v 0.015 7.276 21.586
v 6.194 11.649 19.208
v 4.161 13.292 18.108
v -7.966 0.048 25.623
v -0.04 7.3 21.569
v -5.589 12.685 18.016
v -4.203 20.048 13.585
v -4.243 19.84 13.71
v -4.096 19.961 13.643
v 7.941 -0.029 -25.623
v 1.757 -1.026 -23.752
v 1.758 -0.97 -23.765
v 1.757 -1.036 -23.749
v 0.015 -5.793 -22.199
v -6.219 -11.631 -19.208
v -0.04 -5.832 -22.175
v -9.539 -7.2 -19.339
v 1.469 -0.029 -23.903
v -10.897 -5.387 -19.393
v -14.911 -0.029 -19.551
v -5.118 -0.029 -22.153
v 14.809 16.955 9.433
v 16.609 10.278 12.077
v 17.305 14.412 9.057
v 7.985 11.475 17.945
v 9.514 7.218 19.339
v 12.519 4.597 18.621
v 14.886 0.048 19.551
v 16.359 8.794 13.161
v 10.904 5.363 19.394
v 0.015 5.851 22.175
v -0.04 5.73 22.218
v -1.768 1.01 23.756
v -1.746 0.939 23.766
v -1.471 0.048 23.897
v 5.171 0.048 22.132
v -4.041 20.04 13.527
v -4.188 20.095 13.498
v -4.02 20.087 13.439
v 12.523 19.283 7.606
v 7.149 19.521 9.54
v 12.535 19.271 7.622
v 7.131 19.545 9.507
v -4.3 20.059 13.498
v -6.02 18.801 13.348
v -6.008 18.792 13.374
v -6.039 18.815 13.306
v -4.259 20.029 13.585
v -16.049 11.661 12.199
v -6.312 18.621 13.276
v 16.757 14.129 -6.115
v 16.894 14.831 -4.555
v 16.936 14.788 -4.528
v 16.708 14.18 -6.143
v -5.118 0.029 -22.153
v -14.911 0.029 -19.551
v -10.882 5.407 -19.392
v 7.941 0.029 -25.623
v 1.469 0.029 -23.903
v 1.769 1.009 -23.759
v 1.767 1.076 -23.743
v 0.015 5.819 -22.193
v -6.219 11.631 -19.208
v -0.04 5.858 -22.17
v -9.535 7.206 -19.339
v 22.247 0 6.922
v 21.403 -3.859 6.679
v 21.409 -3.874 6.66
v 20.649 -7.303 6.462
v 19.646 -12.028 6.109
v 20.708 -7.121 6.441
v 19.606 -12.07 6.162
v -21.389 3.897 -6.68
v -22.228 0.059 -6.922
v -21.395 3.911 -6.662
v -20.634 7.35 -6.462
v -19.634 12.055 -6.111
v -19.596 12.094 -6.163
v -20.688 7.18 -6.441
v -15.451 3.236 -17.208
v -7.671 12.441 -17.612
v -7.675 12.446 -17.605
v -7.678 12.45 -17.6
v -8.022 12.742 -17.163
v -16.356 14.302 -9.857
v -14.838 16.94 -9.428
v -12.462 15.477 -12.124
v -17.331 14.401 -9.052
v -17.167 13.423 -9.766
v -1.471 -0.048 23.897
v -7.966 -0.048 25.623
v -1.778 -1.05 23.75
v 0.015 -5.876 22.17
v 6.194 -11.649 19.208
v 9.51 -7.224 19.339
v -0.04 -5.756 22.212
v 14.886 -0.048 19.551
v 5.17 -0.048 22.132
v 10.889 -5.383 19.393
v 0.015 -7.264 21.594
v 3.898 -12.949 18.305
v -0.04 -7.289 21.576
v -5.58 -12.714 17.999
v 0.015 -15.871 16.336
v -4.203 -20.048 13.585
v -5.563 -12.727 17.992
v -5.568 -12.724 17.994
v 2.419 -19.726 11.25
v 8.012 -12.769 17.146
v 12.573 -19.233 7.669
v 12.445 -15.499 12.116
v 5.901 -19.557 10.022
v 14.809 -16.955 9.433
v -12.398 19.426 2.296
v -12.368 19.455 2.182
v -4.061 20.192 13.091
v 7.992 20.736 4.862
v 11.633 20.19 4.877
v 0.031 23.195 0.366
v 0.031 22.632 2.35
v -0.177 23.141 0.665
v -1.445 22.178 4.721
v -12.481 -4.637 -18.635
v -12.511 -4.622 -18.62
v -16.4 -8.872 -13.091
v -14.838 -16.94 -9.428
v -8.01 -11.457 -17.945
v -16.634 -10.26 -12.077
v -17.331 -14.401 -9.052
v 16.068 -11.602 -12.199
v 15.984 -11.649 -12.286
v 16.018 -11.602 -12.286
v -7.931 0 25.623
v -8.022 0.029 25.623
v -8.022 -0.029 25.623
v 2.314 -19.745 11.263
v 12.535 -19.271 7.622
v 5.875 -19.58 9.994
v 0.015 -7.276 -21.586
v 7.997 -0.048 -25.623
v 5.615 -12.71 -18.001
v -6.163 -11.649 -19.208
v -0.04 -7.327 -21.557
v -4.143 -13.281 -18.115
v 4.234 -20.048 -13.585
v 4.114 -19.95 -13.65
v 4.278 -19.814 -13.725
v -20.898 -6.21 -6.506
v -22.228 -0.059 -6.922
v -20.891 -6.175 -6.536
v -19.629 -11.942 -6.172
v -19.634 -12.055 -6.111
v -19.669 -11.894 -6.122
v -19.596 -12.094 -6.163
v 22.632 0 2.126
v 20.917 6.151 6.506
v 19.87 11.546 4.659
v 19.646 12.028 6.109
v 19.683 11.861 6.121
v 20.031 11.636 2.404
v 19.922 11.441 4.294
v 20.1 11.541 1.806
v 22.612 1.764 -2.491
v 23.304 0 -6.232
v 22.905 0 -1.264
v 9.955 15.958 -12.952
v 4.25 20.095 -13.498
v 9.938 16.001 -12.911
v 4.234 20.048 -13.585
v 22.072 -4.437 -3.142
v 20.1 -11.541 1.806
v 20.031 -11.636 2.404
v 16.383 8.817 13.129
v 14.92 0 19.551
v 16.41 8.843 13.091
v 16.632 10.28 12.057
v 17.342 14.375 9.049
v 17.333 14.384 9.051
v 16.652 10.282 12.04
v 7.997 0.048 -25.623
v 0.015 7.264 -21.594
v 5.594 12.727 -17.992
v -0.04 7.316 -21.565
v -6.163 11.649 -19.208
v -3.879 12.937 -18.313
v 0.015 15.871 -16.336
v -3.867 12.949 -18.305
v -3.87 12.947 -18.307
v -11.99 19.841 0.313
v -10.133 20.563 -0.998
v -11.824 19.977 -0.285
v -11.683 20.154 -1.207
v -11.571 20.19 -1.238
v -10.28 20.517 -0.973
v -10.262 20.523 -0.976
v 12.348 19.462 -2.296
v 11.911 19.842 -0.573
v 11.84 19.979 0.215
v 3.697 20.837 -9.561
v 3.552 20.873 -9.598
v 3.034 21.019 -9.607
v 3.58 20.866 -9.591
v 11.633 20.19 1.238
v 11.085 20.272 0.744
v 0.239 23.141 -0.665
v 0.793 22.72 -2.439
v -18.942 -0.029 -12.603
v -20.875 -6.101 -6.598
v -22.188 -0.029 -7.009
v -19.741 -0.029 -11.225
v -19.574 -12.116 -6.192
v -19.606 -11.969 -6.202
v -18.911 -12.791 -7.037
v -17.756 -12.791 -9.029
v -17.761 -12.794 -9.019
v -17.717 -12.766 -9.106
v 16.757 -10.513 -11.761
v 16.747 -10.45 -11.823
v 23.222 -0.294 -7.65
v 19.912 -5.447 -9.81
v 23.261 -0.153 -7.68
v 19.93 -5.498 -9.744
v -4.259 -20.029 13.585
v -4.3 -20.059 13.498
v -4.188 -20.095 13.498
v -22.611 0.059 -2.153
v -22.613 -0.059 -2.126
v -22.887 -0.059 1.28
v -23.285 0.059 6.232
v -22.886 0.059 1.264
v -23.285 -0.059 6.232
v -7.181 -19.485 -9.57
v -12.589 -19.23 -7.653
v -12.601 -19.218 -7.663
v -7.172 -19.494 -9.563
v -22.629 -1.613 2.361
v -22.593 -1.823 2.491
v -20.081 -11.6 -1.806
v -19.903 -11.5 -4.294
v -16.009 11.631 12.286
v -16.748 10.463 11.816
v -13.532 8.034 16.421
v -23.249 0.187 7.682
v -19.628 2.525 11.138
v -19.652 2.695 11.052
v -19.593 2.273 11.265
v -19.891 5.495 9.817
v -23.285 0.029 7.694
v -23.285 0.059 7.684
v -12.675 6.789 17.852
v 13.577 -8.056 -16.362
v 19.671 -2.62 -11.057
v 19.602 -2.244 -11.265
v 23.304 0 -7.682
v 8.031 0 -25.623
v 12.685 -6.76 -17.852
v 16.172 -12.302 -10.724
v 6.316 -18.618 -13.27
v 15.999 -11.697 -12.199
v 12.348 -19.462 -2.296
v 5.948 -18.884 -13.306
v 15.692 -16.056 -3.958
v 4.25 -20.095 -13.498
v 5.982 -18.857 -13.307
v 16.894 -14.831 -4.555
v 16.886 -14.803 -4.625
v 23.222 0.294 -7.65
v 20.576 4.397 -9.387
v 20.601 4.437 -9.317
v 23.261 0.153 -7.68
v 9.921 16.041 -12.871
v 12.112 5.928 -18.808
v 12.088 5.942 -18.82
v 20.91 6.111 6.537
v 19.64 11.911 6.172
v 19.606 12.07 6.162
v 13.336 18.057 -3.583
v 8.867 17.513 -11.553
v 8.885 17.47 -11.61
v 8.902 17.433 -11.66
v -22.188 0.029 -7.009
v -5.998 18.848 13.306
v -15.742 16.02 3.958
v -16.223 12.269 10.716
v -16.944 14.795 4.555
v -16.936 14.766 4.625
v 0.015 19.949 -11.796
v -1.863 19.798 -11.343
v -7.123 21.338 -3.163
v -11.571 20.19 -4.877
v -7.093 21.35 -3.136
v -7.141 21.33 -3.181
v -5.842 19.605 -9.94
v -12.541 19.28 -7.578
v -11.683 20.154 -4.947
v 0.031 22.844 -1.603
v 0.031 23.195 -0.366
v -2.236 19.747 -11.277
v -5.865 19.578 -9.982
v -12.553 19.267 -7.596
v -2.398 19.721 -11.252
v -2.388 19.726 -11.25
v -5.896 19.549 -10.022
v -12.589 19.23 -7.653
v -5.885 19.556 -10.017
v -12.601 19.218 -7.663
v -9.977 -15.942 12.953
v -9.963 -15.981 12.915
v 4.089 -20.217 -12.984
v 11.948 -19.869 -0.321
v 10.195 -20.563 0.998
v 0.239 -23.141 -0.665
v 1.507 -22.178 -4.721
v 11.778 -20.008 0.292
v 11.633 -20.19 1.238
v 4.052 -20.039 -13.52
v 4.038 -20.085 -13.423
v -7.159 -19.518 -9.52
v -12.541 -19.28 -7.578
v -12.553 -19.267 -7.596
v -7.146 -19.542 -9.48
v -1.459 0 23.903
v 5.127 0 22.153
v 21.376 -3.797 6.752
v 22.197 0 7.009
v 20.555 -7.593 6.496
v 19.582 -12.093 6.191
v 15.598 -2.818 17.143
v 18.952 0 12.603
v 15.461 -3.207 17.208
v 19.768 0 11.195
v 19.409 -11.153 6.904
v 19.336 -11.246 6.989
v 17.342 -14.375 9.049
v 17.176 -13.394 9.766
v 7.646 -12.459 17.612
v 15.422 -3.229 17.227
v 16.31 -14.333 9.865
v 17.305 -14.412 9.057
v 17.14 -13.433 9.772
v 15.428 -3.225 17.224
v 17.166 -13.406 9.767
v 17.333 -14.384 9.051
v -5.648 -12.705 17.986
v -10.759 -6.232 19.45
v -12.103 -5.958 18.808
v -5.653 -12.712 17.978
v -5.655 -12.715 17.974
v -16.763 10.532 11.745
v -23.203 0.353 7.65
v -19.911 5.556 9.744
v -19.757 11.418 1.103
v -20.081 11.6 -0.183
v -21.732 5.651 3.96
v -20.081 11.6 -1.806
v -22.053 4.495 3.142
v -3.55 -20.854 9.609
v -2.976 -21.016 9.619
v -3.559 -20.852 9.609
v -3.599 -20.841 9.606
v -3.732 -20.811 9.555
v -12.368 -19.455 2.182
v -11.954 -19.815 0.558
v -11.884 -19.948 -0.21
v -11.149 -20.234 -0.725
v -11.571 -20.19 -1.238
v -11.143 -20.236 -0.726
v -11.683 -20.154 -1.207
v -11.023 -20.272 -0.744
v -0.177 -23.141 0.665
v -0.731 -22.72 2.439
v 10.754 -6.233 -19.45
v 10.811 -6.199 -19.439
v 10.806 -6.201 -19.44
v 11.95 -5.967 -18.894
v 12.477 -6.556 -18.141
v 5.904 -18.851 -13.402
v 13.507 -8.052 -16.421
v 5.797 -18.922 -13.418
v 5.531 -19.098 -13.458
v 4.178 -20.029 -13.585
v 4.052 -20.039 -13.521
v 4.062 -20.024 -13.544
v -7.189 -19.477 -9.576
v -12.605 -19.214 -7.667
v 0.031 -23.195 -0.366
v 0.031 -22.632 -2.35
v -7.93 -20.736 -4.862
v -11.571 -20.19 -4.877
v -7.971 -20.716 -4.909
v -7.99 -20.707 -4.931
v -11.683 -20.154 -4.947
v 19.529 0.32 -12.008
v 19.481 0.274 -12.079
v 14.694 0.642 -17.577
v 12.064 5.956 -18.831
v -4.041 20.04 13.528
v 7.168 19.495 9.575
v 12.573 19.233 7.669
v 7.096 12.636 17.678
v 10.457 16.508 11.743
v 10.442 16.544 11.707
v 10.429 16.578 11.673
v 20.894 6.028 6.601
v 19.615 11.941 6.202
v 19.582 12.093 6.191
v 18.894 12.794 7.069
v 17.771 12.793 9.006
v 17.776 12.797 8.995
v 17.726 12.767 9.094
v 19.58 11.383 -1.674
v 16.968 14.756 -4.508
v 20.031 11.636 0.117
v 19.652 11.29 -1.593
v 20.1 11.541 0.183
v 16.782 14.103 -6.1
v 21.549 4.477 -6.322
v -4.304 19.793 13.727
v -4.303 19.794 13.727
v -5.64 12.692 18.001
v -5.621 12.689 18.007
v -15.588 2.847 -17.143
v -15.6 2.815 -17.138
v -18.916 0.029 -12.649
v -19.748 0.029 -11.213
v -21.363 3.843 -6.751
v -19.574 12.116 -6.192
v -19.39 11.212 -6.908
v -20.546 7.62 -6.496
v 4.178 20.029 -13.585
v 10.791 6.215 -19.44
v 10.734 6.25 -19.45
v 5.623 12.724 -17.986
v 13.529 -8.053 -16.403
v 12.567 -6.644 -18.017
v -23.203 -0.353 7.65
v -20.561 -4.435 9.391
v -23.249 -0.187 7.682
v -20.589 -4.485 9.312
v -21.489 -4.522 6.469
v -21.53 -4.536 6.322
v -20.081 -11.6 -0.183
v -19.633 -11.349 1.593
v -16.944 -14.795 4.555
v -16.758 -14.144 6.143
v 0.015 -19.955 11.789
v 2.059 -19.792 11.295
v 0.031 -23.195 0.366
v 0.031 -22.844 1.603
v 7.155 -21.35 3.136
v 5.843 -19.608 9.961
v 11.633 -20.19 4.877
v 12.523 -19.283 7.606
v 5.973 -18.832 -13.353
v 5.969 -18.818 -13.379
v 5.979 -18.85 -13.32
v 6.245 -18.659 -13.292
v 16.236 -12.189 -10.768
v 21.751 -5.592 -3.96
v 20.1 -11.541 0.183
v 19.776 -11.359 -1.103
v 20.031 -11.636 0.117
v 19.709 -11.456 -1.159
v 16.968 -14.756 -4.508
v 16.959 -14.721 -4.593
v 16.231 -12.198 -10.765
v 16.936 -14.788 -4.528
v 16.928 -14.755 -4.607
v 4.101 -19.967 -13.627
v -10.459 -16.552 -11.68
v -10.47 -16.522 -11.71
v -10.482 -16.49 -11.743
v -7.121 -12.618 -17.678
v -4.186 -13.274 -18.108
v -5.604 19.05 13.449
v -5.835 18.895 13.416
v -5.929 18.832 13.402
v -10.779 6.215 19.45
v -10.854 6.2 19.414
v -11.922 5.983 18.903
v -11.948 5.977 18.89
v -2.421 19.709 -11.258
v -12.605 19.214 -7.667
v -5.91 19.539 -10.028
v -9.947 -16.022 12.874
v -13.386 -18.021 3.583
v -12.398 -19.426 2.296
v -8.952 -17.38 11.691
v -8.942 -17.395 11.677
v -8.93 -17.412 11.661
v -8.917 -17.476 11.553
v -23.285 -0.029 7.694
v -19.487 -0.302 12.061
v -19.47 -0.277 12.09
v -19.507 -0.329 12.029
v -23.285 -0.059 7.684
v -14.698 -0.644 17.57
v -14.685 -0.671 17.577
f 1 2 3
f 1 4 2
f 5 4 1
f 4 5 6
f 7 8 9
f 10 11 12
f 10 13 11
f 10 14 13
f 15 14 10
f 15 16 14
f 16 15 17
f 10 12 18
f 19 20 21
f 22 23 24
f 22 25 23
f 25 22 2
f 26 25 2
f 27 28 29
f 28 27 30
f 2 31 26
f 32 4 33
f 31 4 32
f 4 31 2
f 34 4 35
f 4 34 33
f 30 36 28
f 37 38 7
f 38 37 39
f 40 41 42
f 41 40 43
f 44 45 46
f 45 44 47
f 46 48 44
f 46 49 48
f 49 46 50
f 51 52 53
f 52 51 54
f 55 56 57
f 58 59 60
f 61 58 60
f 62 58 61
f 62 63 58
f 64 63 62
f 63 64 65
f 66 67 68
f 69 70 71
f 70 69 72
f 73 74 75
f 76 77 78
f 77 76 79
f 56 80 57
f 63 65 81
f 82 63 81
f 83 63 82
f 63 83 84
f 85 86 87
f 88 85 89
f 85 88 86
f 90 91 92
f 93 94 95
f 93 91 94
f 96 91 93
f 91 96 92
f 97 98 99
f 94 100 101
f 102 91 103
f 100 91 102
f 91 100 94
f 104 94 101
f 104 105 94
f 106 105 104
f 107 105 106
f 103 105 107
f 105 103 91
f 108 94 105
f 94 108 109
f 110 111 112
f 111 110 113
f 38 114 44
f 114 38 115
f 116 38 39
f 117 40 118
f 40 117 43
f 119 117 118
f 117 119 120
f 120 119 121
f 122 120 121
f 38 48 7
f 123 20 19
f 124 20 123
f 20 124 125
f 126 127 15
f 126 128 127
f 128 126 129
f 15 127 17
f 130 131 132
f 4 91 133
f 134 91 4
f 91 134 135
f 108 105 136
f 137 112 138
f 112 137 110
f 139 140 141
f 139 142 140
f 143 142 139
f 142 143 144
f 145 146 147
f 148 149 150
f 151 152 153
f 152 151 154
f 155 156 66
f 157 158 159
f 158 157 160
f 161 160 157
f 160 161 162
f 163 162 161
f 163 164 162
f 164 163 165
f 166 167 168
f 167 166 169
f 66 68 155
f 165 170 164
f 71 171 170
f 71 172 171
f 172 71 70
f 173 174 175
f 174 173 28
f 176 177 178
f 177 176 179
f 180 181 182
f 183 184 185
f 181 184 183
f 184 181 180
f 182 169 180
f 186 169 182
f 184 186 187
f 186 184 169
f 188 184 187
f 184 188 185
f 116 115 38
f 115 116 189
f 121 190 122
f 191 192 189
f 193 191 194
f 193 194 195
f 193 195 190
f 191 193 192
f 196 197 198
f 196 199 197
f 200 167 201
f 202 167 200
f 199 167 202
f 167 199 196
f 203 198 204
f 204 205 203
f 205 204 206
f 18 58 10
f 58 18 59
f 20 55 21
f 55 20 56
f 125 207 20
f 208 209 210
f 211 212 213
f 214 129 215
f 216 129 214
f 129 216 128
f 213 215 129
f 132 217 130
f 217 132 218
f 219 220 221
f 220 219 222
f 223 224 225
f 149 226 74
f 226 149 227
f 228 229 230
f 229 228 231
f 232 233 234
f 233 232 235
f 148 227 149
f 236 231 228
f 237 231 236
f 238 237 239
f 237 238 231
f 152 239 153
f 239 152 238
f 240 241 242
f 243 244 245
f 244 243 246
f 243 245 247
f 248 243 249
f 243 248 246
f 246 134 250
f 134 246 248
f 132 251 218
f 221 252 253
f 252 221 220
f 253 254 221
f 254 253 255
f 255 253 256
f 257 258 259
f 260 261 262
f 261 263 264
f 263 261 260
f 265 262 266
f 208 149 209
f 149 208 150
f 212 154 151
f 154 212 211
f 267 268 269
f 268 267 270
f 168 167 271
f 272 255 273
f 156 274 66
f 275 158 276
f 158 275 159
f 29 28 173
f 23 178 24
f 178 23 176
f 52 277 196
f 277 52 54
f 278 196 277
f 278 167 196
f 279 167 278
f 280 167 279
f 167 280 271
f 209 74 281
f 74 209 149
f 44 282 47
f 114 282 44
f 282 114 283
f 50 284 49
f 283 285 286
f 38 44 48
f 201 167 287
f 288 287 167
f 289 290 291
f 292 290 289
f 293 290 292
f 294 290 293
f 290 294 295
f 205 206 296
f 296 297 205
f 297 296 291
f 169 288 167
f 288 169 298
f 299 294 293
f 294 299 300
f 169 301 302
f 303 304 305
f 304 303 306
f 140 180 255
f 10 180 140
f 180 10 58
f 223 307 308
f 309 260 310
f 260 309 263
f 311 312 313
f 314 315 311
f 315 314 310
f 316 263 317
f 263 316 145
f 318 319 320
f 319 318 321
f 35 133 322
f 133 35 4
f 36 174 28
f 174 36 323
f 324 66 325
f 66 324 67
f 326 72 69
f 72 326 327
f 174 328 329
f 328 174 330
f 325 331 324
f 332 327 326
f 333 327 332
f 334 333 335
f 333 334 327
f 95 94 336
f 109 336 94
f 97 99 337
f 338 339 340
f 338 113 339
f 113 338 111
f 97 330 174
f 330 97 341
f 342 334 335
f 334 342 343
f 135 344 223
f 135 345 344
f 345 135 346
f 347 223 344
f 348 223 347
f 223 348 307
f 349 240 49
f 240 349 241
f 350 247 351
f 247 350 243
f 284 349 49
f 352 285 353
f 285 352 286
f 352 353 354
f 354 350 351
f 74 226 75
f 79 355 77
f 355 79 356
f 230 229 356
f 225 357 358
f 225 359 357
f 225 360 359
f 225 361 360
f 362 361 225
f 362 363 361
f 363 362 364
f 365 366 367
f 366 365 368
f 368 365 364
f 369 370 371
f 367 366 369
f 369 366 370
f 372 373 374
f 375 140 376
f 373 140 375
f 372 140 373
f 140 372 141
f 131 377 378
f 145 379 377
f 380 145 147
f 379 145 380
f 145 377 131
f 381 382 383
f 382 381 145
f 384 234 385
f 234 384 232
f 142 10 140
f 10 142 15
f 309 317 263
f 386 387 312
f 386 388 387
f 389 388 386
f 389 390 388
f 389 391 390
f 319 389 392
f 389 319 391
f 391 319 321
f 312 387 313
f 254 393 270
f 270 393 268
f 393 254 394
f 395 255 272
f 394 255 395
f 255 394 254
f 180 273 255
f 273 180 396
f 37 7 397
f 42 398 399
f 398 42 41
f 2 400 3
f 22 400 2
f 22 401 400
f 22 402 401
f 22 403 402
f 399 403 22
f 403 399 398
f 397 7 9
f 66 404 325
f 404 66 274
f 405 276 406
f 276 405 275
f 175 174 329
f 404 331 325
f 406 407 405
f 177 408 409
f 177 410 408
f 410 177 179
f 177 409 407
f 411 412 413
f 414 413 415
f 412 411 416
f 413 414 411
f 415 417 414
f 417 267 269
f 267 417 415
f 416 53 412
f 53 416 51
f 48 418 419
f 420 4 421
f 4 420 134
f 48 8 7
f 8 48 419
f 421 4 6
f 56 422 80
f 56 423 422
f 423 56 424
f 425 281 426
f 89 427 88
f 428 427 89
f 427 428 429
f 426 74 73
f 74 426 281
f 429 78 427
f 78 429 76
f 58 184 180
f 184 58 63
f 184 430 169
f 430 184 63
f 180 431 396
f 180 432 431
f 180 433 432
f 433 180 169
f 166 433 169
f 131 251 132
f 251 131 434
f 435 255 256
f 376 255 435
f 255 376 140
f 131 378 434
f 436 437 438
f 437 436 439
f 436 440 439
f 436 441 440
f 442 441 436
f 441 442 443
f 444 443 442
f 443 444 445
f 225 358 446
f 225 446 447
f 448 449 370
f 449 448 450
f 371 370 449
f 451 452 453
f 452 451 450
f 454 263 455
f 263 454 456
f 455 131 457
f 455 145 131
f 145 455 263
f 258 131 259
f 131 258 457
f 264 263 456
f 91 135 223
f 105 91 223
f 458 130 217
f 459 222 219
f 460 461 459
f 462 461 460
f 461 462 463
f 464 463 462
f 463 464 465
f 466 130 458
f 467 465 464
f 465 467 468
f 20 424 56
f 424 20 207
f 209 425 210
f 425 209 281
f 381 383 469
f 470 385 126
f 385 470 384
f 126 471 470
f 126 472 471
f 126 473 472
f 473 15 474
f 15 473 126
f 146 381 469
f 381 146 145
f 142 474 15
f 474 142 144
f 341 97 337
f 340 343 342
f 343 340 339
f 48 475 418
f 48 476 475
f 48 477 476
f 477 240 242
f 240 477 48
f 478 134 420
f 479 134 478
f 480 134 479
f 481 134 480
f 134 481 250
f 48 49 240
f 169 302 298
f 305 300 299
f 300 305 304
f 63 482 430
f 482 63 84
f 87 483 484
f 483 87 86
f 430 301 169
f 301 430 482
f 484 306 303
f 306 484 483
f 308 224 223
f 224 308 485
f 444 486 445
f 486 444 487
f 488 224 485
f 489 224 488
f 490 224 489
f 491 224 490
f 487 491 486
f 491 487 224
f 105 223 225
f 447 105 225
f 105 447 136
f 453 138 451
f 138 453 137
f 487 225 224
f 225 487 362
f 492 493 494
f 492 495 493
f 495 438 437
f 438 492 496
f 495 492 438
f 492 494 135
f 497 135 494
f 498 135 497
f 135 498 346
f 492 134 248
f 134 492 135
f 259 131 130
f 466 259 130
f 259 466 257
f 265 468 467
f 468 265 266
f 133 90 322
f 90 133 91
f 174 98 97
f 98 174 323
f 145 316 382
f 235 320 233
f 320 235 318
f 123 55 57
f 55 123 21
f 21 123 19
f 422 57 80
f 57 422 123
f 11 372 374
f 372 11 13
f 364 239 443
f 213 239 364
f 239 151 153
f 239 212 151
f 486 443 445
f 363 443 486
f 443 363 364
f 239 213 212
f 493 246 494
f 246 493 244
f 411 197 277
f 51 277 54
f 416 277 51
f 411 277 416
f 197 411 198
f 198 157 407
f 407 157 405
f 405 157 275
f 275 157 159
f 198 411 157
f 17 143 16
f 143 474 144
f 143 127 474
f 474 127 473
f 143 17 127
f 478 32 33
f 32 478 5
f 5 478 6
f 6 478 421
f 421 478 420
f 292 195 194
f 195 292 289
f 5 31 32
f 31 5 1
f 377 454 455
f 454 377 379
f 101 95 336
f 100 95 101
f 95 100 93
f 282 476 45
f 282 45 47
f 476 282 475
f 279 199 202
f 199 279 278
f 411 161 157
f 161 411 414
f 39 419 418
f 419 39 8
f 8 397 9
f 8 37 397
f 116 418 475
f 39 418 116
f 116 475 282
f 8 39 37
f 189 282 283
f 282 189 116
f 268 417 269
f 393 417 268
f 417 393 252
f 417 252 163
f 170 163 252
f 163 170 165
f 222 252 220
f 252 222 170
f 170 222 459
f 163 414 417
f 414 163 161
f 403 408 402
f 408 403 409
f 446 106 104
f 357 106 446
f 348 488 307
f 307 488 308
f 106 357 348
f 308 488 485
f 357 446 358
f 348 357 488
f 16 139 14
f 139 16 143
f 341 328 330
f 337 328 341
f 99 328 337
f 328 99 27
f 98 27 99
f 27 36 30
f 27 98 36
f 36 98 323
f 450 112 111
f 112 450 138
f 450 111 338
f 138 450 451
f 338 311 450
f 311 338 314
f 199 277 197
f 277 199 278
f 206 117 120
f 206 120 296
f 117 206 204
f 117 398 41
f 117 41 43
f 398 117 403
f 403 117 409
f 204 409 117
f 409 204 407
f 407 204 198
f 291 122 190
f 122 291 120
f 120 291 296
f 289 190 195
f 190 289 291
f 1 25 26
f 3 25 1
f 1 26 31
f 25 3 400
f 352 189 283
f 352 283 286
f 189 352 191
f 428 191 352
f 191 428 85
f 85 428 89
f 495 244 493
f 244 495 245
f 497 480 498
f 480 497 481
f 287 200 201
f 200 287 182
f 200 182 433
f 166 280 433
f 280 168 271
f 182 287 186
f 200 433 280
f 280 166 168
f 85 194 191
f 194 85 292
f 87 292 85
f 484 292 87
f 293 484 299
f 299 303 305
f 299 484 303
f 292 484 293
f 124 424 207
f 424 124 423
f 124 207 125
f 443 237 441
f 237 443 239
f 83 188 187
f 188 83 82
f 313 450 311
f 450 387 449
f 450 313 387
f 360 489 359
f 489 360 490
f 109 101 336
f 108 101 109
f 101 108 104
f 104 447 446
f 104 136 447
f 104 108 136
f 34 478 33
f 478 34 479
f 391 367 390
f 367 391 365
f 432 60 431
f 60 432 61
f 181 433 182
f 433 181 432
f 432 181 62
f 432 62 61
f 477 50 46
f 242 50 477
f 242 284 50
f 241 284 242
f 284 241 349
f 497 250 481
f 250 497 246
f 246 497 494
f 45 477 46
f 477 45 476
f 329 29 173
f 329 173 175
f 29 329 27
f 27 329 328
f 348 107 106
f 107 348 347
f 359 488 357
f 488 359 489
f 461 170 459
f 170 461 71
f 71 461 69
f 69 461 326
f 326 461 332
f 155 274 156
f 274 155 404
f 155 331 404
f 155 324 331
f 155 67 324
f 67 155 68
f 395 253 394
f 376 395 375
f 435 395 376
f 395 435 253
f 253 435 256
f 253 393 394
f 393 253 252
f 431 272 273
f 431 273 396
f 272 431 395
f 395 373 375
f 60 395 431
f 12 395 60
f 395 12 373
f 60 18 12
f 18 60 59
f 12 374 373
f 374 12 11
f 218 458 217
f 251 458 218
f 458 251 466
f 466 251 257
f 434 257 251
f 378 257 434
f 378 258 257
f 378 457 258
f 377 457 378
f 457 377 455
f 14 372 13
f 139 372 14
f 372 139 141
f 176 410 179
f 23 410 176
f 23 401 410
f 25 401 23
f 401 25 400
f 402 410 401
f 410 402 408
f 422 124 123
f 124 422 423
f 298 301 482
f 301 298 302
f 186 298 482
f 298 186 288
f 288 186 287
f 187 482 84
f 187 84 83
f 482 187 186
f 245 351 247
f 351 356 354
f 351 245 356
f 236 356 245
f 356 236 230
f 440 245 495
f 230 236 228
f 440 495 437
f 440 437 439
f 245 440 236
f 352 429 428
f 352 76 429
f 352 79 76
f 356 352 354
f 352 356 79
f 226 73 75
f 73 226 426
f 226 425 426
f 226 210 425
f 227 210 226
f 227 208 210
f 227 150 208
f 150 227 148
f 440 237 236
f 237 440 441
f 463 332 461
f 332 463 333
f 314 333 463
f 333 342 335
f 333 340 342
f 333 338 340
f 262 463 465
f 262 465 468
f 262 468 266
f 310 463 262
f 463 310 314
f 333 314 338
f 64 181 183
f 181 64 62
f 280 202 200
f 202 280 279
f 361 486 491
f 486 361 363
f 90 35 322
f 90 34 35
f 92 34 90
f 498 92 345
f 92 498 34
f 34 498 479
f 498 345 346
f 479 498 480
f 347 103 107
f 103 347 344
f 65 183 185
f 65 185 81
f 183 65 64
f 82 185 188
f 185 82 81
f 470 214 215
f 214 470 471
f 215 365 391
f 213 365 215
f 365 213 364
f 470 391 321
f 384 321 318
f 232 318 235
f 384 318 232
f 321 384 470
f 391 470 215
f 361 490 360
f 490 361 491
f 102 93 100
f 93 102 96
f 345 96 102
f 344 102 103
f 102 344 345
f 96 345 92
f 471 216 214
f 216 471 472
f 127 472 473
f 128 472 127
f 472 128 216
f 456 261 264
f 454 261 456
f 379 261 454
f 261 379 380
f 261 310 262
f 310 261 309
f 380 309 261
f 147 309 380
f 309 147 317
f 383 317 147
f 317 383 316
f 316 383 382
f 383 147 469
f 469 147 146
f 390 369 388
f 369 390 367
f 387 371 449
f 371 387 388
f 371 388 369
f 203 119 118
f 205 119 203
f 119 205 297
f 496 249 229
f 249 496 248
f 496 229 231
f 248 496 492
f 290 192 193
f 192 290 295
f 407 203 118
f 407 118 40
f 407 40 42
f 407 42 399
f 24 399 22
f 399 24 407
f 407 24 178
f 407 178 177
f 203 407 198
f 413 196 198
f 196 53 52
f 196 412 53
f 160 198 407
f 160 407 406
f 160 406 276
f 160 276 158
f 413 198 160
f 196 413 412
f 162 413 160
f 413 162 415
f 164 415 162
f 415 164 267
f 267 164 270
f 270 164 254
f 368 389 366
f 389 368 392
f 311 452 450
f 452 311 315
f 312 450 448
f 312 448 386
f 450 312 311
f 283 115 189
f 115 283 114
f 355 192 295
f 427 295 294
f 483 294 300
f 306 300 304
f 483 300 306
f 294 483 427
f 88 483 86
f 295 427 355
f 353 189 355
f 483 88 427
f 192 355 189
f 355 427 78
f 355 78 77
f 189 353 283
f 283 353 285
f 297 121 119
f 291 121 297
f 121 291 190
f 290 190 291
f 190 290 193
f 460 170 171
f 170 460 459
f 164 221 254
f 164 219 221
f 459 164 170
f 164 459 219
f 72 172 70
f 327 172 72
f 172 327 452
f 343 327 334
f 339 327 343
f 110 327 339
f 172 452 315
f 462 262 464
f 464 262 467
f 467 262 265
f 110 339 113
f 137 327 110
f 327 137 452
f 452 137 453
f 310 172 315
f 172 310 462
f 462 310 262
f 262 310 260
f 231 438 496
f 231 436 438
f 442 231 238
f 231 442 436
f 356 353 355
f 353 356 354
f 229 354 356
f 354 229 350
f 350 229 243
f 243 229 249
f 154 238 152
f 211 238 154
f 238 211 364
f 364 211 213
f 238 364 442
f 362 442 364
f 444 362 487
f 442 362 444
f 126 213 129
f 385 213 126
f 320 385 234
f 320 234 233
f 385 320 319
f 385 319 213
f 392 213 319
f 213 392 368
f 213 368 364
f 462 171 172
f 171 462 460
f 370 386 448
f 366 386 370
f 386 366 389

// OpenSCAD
// Auto-generated OpenSCAD file

    inner_points = 10*[[-3.47499806707674e-14, -2.1833691521382983, -1.5462074923815674], [3.47499806707674e-14, 2.1833691521382983, 1.5462074923815674], [-1.8918058124456312, -1.0933338029844222, 1.543875133310512], [1.8918058124456312, 1.0933338029844222, -1.543875133310512], [-1.8918058124455932, 1.0933338029844843, -1.5438751333105147], [1.8918058124455932, -1.0933338029844843, 1.5438751333105147], [-1.1601886205085532, -2.0095051280160465, -0.0014303669199956515], [-1.1601886205085106, 0.6684864798070899, 1.8950563927723993], [1.1601886205085106, -0.6684864798070899, -1.8950563927723993], [1.1601886205085532, 2.0095051280160465, 0.0014303669199956515], [-2.3203772410170407, 3.8191672047105385e-14, -1.5543122344752192e-15], [-2.3203661214665772e-14, -1.341018648208995, 1.8936260258524051], [2.3203661214665772e-14, 1.341018648208995, -1.8936260258524051], [2.3203772410170407, -3.8191672047105385e-14, 1.5543122344752192e-15], [-1.16018862050853, -0.668486479807052, -1.8950563927724011], [-1.1601886205084877, 2.0095051280160847, 0.0014303669199940883], [1.1601886205084877, -2.0095051280160847, -0.0014303669199940883], [1.16018862050853, 0.668486479807052, 1.8950563927724011], [-2.000000000000018, -1.15411906326459, -0.8173182903919333], [-1.9999999999999818, 1.1541190632646554, 0.8173182903919303], [-3.8413716652030416e-14, -2.3099816743124846, 0.8148525414702299], [-1.6568777599923479e-15, -0.0017435477832387337, 2.4494891222540933], [1.6568777599923479e-15, 0.0017435477832387337, -2.4494891222540933], [3.8413716652030416e-14, 2.3099816743124846, -0.8148525414702299], [1.9999999999999818, -1.1541190632646554, -0.8173182903919303], [2.000000000000018, 1.15411906326459, 0.8173182903919333]];

    outer_points = 10*[[-1.8056644779989666, -1.891805812445581, -0.5643624942320662], [1.8056644779989666, 1.891805812445581, 0.5643624942320662], [-0.7981290934376827, 0.0, 2.553595193881432], [0.7981290934376827, 0.0, -2.553595193881432], [-1.8056644779989073, 1.891805812445643, -0.5643624942320478], [1.8056644779989073, -1.891805812445643, 0.5643624942320478], [-1.596829680858636, -1.1601886205085012, 1.21993765242382], [0.6178916885853913, 1.1601886205085012, 1.9121513451213865], [-0.6178916885853913, -1.1601886205085012, -1.9121513451213865], [1.596829680858636, 1.1601886205085012, -1.21993765242382], [-1.5968296808585998, 1.1601886205085392, 1.2199376524238312], [0.6178916885853551, -1.1601886205085392, 1.9121513451213752], [-0.6178916885853551, 1.1601886205085392, -1.9121513451213752], [1.5968296808585998, -1.1601886205085392, -1.2199376524238312], [-2.2147213694439913, 3.7969627442180354e-14, -0.6922136926975554], [3.6240721465258615e-14, 2.3203772410170407, 1.1327078872132876e-14], [-3.6240721465258615e-14, -2.3203772410170407, -1.1327078872132876e-14], [2.2147213694439913, -3.7969627442180354e-14, 0.6922136926975554], [-2.3308195906932307, 3.2529534621517087e-14, 0.7531799490431484], [-0.4218874306162803, 2.0, 1.3498188752154838], [-0.4218874306163424, -2.0, 1.3498188752154643], [1.4870447294606082, -3.2529534621517087e-14, 1.9464578013877998], [-1.4870447294606082, 3.2529534621517087e-14, -1.9464578013877998], [0.4218874306163424, 2.0, -1.3498188752154643], [0.4218874306162803, -2.0, -1.3498188752154838], [2.3308195906932307, -3.2529534621517087e-14, -0.7531799490431484]];

    // Convex hull for inner set (I)
    module inner_hull() {
        hull() {
            for (p = inner_points) {
                translate(p) sphere(r=0.1);
            }
        }
    }

    // Convex hull for outer set (O) minus inner hull (O \ I)
    module outer_minus_inner() {
        difference() {
            hull() {
                for (p = outer_points) {
                    translate(p) sphere(r=0.1);
                }
            }
            inner_hull(); // Subtract inner hull
        }
    }

    // Convex hull for outer set (O) minus all translated inner hulls
    module outer_minus_AllTranslationInner() {
        difference() {
            hull() {
                for (p = outer_points) {
                    translate(p) sphere(r=0.1);
                }
            }
            hull() {
                translate([0,0,50]) inner_hull();
                translate([0,0,-50]) inner_hull();
            }; // Subtract translated inner hulls
        }
    }

    // Difference between outer_minus_inner and outer_minus_AllTranslationInner
    module outer_minus_inner_diff() {
        difference() {
            // Outer minus inner
            difference() {
                hull() {
                    for (p = outer_points) {
                        translate(p) sphere(r=0.1);
                    }
                }
                inner_hull();
            }

            // Subtract Outer minus AllTranslationInner
            difference() {
                hull() {
                    for (p = outer_points) {
                        translate(p) sphere(r=0.1);
                    }
                }
                hull() {
                    translate([0,0,50]) inner_hull();
                    translate([0,0,-50]) inner_hull();
                };
            }
        }
    }

    // Rendering all with colors applied
    // color([1, 0, 0, 0.5]) inner_hull(); // Transparent red
    // color([0, 0, 1, 1]) outer_minus_inner(); // Opaque blue
    color([1, 1, 0, 1]) outer_minus_inner_diff(); // Opaque yellow
    
